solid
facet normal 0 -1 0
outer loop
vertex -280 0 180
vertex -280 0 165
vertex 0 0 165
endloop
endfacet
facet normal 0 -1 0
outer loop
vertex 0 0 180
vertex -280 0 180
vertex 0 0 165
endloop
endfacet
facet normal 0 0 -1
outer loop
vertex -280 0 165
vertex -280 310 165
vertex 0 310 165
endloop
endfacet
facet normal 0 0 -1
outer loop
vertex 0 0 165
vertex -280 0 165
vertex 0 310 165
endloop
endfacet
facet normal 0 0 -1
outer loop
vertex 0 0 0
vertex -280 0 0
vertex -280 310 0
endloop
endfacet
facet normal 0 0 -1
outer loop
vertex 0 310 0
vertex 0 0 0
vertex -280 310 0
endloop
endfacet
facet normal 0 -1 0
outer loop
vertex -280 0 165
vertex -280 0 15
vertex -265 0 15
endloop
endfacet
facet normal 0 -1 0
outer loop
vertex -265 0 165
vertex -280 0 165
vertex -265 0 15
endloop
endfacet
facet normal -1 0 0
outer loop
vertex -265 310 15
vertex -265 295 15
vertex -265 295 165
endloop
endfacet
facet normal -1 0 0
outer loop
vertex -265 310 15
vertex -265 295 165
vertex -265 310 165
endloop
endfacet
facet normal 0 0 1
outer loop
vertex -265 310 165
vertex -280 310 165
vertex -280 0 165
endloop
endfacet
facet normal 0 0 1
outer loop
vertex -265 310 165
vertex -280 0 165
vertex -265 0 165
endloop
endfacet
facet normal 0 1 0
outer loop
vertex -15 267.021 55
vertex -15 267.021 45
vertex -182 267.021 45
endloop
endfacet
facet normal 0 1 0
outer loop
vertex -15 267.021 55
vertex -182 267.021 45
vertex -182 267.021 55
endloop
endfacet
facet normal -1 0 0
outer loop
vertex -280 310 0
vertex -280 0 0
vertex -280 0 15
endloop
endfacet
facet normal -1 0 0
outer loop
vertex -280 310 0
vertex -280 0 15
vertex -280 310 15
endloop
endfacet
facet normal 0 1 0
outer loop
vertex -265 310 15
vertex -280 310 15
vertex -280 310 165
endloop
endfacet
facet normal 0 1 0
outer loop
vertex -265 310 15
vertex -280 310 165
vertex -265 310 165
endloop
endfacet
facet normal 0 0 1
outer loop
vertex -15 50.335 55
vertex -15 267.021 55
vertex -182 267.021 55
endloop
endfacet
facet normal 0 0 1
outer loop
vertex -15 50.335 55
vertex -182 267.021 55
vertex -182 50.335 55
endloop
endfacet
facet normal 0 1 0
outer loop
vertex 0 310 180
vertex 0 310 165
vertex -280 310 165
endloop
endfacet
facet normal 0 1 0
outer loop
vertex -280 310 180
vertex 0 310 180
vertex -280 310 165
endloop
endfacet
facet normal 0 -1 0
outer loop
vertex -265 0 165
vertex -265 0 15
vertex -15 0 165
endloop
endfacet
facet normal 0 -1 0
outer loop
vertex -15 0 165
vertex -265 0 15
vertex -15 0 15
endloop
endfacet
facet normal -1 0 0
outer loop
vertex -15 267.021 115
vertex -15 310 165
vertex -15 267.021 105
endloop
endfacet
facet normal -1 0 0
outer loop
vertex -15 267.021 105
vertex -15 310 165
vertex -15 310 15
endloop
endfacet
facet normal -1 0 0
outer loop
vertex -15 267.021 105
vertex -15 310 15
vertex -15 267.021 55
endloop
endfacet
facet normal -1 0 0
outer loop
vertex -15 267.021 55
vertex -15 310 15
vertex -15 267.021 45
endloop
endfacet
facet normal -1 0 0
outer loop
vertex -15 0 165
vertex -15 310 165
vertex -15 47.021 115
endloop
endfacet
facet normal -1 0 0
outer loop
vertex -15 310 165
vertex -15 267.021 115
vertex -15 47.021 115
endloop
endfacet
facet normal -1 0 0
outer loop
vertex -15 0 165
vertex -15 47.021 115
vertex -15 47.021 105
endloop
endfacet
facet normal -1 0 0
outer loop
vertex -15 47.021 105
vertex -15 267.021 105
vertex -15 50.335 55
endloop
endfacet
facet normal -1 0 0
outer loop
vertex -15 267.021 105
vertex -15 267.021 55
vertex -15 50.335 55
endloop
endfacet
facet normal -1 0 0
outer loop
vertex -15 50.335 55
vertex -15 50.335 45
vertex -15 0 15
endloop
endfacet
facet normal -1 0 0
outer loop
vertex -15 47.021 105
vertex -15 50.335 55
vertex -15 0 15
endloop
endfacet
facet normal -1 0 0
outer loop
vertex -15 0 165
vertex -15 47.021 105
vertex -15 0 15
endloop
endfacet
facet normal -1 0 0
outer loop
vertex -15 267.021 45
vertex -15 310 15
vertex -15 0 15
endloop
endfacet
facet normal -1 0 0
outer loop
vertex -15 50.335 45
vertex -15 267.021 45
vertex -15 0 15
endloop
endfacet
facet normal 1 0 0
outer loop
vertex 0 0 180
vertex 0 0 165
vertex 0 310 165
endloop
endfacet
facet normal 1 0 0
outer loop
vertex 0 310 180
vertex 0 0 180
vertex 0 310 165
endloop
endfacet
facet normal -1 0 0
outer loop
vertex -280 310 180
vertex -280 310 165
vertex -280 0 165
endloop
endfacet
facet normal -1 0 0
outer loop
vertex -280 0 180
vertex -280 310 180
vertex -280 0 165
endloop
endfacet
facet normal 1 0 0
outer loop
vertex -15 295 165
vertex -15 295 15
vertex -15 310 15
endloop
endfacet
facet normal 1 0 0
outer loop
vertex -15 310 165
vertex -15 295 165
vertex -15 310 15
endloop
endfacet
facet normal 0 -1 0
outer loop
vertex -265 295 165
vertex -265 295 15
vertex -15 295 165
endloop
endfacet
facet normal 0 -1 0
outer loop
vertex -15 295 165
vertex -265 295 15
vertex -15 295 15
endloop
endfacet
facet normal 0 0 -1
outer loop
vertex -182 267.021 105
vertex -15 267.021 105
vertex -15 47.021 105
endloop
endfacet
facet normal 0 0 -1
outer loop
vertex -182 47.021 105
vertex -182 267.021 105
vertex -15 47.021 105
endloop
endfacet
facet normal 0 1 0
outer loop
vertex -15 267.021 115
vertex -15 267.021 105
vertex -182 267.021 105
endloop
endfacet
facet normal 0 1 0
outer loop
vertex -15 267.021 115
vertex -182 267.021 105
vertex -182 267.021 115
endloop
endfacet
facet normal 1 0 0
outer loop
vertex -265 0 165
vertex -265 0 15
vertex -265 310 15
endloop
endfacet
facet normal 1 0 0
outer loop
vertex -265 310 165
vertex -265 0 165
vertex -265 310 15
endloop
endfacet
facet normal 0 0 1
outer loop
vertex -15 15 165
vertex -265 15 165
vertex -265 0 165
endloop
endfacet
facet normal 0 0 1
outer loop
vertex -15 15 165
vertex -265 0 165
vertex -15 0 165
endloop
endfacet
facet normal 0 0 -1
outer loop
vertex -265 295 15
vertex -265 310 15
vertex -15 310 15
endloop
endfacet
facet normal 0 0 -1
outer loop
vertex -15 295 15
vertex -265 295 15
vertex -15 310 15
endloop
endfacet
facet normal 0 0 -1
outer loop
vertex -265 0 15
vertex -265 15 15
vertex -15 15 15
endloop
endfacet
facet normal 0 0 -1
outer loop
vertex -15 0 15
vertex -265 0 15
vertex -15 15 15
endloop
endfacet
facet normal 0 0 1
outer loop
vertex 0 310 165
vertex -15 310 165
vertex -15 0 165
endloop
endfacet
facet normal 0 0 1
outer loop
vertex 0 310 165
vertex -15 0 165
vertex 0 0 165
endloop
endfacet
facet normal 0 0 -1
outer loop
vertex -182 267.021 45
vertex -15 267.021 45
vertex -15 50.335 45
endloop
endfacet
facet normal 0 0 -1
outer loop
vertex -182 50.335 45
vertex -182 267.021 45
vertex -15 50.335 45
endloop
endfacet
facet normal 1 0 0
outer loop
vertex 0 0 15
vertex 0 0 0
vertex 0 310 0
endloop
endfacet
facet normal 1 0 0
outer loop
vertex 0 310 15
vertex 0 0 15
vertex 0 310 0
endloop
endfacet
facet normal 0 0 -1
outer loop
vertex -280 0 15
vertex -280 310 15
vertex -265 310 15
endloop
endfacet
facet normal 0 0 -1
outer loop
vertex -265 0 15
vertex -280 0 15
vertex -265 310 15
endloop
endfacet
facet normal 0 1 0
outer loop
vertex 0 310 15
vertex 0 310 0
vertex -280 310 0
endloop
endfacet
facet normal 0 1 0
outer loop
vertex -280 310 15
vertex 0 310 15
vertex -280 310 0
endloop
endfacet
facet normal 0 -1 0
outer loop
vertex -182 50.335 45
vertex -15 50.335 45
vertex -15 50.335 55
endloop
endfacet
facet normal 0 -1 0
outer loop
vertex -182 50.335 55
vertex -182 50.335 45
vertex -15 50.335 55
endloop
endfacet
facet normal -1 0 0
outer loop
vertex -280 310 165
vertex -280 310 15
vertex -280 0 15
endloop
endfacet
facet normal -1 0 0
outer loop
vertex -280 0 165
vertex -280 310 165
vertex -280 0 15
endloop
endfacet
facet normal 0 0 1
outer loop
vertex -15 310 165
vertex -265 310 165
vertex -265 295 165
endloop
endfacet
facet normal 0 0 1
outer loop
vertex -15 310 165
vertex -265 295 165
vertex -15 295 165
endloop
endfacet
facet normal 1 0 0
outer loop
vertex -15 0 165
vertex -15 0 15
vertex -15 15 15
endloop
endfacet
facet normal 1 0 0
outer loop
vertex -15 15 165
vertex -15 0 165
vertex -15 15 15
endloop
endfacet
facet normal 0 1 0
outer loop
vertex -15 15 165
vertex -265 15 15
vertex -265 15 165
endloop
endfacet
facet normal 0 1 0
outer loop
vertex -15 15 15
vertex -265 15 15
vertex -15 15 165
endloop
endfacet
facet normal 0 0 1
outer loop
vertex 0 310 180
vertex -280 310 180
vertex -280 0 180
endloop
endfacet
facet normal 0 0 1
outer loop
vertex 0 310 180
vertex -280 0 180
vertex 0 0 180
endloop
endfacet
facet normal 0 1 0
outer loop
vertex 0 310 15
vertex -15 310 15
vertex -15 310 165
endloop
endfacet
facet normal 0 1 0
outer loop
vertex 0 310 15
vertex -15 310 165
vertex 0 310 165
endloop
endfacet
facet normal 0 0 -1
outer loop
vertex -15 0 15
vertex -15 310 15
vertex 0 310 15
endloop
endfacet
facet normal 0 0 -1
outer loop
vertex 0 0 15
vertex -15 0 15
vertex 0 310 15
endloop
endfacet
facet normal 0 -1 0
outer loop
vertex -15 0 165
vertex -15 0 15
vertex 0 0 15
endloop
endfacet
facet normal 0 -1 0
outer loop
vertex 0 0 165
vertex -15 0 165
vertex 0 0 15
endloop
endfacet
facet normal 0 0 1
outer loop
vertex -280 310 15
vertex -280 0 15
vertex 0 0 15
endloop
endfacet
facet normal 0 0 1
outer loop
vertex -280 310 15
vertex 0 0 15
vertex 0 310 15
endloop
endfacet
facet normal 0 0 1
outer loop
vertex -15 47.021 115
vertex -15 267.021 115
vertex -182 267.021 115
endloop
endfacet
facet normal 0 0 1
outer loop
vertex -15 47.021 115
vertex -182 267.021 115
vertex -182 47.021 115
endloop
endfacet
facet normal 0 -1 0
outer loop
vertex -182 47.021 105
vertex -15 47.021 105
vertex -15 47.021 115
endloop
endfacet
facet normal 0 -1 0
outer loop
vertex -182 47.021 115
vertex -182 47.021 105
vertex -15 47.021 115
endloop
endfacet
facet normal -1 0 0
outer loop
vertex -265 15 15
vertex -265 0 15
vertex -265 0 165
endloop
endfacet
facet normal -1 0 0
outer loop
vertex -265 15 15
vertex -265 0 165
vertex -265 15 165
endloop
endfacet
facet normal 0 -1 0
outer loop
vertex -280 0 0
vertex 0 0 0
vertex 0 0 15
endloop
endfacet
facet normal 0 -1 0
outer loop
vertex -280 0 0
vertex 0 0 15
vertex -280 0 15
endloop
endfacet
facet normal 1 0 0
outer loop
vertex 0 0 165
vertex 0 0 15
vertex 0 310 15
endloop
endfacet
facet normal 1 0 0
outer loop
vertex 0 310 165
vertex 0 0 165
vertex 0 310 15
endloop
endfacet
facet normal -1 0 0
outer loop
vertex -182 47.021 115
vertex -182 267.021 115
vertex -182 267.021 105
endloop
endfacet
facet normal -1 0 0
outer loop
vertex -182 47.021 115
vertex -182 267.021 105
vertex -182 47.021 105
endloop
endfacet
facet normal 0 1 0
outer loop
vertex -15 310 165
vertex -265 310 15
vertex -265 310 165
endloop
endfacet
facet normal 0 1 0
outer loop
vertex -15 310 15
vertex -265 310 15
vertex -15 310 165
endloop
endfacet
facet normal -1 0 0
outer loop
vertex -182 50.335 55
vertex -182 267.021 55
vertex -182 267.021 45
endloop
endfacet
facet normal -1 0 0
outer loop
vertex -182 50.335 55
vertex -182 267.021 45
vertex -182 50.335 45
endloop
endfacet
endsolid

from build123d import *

# Parameters (mm, degrees)
CROQUIS3_W                = 310
CROQUIS3_H                = 280
SALIENTE_EXTRUIR1_DEPTH   = 15
CROQUIS4_W                = 15
CROQUIS4_H                = 310
SALIENTE_EXTRUIR2_DEPTH   = 150
SALIENTE_EXTRUIR2_2_DEPTH = 150
CROQUIS4_3_W              = 250
CROQUIS4_3_H              = 15
SALIENTE_EXTRUIR3_DEPTH   = 150
SALIENTE_EXTRUIR3_2_DEPTH = 150
SALIENTE_EXTRUIR4_DEPTH   = 15
CROQUIS7_W                = 220
CROQUIS7_H                = 10
CROQUIS7_W_2              = 216.686186971
SALIENTE_EXTRUIR5_DEPTH   = 167


with BuildPart() as part:
    # Croquis3 → Saliente-Extruir1 (new body)
    with BuildSketch(Plane(origin=(0, 0, 0), x_dir=(0, 1, 0), z_dir=(0, 0, 1))):
        with Locations((155, 140)):
            Rectangle(CROQUIS3_W, CROQUIS3_H)
    extrude(amount=SALIENTE_EXTRUIR1_DEPTH)


with BuildPart() as body_2:
    # Croquis4 → Saliente-Extruir2 (new body)
    with BuildSketch(Plane.XY.offset(15)):
        with Locations((-272.5, 155)):
            Rectangle(CROQUIS4_W, CROQUIS4_H)
    extrude(amount=SALIENTE_EXTRUIR2_DEPTH)


with BuildPart() as body_3:
    # Croquis4 → Saliente-Extruir2 2 (new body)
    with BuildSketch(Plane.XY.offset(15)):
        with Locations((-7.5, 155)):
            Rectangle(CROQUIS4_W, CROQUIS4_H)
    extrude(amount=SALIENTE_EXTRUIR2_2_DEPTH)

    # Croquis7 → Saliente-Extruir5 (add)
    with BuildSketch(Plane(origin=(-15, 0, 0), x_dir=(0, -1, 0), z_dir=(-1, 0, 0))):
        with Locations((-157.021140195, 110)):
            Rectangle(CROQUIS7_W, CROQUIS7_H)
        with Locations((-158.67804671, 50)):
            Rectangle(CROQUIS7_W_2, CROQUIS7_H)
    extrude(amount=SALIENTE_EXTRUIR5_DEPTH)


with BuildPart() as body_4:
    # Croquis4<3> → Saliente-Extruir3 (new body)
    with BuildSketch(Plane.XY.offset(15)):
        with Locations((-140, 302.5)):
            Rectangle(CROQUIS4_3_W, CROQUIS4_3_H)
    extrude(amount=SALIENTE_EXTRUIR3_DEPTH)


with BuildPart() as body_5:
    # Croquis4<3> → Saliente-Extruir3 2 (new body)
    with BuildSketch(Plane.XY.offset(15)):
        with Locations((-140, 7.5)):
            Rectangle(CROQUIS4_3_W, CROQUIS4_3_H)
    extrude(amount=SALIENTE_EXTRUIR3_2_DEPTH)


with BuildPart() as body_6:
    # Croquis5 → Saliente-Extruir4 (new body)
    with BuildSketch(Plane.XY.offset(165)):
        Polygon((-15, 0), (0, 0), (0, 310), (-15, 310), (-265, 310), (-280, 310), (-280, 0), (-265, 0), align=None)
    extrude(amount=SALIENTE_EXTRUIR4_DEPTH)


solid = Compound([part.part, body_2.part, body_3.part, body_4.part, body_5.part, body_6.part])
